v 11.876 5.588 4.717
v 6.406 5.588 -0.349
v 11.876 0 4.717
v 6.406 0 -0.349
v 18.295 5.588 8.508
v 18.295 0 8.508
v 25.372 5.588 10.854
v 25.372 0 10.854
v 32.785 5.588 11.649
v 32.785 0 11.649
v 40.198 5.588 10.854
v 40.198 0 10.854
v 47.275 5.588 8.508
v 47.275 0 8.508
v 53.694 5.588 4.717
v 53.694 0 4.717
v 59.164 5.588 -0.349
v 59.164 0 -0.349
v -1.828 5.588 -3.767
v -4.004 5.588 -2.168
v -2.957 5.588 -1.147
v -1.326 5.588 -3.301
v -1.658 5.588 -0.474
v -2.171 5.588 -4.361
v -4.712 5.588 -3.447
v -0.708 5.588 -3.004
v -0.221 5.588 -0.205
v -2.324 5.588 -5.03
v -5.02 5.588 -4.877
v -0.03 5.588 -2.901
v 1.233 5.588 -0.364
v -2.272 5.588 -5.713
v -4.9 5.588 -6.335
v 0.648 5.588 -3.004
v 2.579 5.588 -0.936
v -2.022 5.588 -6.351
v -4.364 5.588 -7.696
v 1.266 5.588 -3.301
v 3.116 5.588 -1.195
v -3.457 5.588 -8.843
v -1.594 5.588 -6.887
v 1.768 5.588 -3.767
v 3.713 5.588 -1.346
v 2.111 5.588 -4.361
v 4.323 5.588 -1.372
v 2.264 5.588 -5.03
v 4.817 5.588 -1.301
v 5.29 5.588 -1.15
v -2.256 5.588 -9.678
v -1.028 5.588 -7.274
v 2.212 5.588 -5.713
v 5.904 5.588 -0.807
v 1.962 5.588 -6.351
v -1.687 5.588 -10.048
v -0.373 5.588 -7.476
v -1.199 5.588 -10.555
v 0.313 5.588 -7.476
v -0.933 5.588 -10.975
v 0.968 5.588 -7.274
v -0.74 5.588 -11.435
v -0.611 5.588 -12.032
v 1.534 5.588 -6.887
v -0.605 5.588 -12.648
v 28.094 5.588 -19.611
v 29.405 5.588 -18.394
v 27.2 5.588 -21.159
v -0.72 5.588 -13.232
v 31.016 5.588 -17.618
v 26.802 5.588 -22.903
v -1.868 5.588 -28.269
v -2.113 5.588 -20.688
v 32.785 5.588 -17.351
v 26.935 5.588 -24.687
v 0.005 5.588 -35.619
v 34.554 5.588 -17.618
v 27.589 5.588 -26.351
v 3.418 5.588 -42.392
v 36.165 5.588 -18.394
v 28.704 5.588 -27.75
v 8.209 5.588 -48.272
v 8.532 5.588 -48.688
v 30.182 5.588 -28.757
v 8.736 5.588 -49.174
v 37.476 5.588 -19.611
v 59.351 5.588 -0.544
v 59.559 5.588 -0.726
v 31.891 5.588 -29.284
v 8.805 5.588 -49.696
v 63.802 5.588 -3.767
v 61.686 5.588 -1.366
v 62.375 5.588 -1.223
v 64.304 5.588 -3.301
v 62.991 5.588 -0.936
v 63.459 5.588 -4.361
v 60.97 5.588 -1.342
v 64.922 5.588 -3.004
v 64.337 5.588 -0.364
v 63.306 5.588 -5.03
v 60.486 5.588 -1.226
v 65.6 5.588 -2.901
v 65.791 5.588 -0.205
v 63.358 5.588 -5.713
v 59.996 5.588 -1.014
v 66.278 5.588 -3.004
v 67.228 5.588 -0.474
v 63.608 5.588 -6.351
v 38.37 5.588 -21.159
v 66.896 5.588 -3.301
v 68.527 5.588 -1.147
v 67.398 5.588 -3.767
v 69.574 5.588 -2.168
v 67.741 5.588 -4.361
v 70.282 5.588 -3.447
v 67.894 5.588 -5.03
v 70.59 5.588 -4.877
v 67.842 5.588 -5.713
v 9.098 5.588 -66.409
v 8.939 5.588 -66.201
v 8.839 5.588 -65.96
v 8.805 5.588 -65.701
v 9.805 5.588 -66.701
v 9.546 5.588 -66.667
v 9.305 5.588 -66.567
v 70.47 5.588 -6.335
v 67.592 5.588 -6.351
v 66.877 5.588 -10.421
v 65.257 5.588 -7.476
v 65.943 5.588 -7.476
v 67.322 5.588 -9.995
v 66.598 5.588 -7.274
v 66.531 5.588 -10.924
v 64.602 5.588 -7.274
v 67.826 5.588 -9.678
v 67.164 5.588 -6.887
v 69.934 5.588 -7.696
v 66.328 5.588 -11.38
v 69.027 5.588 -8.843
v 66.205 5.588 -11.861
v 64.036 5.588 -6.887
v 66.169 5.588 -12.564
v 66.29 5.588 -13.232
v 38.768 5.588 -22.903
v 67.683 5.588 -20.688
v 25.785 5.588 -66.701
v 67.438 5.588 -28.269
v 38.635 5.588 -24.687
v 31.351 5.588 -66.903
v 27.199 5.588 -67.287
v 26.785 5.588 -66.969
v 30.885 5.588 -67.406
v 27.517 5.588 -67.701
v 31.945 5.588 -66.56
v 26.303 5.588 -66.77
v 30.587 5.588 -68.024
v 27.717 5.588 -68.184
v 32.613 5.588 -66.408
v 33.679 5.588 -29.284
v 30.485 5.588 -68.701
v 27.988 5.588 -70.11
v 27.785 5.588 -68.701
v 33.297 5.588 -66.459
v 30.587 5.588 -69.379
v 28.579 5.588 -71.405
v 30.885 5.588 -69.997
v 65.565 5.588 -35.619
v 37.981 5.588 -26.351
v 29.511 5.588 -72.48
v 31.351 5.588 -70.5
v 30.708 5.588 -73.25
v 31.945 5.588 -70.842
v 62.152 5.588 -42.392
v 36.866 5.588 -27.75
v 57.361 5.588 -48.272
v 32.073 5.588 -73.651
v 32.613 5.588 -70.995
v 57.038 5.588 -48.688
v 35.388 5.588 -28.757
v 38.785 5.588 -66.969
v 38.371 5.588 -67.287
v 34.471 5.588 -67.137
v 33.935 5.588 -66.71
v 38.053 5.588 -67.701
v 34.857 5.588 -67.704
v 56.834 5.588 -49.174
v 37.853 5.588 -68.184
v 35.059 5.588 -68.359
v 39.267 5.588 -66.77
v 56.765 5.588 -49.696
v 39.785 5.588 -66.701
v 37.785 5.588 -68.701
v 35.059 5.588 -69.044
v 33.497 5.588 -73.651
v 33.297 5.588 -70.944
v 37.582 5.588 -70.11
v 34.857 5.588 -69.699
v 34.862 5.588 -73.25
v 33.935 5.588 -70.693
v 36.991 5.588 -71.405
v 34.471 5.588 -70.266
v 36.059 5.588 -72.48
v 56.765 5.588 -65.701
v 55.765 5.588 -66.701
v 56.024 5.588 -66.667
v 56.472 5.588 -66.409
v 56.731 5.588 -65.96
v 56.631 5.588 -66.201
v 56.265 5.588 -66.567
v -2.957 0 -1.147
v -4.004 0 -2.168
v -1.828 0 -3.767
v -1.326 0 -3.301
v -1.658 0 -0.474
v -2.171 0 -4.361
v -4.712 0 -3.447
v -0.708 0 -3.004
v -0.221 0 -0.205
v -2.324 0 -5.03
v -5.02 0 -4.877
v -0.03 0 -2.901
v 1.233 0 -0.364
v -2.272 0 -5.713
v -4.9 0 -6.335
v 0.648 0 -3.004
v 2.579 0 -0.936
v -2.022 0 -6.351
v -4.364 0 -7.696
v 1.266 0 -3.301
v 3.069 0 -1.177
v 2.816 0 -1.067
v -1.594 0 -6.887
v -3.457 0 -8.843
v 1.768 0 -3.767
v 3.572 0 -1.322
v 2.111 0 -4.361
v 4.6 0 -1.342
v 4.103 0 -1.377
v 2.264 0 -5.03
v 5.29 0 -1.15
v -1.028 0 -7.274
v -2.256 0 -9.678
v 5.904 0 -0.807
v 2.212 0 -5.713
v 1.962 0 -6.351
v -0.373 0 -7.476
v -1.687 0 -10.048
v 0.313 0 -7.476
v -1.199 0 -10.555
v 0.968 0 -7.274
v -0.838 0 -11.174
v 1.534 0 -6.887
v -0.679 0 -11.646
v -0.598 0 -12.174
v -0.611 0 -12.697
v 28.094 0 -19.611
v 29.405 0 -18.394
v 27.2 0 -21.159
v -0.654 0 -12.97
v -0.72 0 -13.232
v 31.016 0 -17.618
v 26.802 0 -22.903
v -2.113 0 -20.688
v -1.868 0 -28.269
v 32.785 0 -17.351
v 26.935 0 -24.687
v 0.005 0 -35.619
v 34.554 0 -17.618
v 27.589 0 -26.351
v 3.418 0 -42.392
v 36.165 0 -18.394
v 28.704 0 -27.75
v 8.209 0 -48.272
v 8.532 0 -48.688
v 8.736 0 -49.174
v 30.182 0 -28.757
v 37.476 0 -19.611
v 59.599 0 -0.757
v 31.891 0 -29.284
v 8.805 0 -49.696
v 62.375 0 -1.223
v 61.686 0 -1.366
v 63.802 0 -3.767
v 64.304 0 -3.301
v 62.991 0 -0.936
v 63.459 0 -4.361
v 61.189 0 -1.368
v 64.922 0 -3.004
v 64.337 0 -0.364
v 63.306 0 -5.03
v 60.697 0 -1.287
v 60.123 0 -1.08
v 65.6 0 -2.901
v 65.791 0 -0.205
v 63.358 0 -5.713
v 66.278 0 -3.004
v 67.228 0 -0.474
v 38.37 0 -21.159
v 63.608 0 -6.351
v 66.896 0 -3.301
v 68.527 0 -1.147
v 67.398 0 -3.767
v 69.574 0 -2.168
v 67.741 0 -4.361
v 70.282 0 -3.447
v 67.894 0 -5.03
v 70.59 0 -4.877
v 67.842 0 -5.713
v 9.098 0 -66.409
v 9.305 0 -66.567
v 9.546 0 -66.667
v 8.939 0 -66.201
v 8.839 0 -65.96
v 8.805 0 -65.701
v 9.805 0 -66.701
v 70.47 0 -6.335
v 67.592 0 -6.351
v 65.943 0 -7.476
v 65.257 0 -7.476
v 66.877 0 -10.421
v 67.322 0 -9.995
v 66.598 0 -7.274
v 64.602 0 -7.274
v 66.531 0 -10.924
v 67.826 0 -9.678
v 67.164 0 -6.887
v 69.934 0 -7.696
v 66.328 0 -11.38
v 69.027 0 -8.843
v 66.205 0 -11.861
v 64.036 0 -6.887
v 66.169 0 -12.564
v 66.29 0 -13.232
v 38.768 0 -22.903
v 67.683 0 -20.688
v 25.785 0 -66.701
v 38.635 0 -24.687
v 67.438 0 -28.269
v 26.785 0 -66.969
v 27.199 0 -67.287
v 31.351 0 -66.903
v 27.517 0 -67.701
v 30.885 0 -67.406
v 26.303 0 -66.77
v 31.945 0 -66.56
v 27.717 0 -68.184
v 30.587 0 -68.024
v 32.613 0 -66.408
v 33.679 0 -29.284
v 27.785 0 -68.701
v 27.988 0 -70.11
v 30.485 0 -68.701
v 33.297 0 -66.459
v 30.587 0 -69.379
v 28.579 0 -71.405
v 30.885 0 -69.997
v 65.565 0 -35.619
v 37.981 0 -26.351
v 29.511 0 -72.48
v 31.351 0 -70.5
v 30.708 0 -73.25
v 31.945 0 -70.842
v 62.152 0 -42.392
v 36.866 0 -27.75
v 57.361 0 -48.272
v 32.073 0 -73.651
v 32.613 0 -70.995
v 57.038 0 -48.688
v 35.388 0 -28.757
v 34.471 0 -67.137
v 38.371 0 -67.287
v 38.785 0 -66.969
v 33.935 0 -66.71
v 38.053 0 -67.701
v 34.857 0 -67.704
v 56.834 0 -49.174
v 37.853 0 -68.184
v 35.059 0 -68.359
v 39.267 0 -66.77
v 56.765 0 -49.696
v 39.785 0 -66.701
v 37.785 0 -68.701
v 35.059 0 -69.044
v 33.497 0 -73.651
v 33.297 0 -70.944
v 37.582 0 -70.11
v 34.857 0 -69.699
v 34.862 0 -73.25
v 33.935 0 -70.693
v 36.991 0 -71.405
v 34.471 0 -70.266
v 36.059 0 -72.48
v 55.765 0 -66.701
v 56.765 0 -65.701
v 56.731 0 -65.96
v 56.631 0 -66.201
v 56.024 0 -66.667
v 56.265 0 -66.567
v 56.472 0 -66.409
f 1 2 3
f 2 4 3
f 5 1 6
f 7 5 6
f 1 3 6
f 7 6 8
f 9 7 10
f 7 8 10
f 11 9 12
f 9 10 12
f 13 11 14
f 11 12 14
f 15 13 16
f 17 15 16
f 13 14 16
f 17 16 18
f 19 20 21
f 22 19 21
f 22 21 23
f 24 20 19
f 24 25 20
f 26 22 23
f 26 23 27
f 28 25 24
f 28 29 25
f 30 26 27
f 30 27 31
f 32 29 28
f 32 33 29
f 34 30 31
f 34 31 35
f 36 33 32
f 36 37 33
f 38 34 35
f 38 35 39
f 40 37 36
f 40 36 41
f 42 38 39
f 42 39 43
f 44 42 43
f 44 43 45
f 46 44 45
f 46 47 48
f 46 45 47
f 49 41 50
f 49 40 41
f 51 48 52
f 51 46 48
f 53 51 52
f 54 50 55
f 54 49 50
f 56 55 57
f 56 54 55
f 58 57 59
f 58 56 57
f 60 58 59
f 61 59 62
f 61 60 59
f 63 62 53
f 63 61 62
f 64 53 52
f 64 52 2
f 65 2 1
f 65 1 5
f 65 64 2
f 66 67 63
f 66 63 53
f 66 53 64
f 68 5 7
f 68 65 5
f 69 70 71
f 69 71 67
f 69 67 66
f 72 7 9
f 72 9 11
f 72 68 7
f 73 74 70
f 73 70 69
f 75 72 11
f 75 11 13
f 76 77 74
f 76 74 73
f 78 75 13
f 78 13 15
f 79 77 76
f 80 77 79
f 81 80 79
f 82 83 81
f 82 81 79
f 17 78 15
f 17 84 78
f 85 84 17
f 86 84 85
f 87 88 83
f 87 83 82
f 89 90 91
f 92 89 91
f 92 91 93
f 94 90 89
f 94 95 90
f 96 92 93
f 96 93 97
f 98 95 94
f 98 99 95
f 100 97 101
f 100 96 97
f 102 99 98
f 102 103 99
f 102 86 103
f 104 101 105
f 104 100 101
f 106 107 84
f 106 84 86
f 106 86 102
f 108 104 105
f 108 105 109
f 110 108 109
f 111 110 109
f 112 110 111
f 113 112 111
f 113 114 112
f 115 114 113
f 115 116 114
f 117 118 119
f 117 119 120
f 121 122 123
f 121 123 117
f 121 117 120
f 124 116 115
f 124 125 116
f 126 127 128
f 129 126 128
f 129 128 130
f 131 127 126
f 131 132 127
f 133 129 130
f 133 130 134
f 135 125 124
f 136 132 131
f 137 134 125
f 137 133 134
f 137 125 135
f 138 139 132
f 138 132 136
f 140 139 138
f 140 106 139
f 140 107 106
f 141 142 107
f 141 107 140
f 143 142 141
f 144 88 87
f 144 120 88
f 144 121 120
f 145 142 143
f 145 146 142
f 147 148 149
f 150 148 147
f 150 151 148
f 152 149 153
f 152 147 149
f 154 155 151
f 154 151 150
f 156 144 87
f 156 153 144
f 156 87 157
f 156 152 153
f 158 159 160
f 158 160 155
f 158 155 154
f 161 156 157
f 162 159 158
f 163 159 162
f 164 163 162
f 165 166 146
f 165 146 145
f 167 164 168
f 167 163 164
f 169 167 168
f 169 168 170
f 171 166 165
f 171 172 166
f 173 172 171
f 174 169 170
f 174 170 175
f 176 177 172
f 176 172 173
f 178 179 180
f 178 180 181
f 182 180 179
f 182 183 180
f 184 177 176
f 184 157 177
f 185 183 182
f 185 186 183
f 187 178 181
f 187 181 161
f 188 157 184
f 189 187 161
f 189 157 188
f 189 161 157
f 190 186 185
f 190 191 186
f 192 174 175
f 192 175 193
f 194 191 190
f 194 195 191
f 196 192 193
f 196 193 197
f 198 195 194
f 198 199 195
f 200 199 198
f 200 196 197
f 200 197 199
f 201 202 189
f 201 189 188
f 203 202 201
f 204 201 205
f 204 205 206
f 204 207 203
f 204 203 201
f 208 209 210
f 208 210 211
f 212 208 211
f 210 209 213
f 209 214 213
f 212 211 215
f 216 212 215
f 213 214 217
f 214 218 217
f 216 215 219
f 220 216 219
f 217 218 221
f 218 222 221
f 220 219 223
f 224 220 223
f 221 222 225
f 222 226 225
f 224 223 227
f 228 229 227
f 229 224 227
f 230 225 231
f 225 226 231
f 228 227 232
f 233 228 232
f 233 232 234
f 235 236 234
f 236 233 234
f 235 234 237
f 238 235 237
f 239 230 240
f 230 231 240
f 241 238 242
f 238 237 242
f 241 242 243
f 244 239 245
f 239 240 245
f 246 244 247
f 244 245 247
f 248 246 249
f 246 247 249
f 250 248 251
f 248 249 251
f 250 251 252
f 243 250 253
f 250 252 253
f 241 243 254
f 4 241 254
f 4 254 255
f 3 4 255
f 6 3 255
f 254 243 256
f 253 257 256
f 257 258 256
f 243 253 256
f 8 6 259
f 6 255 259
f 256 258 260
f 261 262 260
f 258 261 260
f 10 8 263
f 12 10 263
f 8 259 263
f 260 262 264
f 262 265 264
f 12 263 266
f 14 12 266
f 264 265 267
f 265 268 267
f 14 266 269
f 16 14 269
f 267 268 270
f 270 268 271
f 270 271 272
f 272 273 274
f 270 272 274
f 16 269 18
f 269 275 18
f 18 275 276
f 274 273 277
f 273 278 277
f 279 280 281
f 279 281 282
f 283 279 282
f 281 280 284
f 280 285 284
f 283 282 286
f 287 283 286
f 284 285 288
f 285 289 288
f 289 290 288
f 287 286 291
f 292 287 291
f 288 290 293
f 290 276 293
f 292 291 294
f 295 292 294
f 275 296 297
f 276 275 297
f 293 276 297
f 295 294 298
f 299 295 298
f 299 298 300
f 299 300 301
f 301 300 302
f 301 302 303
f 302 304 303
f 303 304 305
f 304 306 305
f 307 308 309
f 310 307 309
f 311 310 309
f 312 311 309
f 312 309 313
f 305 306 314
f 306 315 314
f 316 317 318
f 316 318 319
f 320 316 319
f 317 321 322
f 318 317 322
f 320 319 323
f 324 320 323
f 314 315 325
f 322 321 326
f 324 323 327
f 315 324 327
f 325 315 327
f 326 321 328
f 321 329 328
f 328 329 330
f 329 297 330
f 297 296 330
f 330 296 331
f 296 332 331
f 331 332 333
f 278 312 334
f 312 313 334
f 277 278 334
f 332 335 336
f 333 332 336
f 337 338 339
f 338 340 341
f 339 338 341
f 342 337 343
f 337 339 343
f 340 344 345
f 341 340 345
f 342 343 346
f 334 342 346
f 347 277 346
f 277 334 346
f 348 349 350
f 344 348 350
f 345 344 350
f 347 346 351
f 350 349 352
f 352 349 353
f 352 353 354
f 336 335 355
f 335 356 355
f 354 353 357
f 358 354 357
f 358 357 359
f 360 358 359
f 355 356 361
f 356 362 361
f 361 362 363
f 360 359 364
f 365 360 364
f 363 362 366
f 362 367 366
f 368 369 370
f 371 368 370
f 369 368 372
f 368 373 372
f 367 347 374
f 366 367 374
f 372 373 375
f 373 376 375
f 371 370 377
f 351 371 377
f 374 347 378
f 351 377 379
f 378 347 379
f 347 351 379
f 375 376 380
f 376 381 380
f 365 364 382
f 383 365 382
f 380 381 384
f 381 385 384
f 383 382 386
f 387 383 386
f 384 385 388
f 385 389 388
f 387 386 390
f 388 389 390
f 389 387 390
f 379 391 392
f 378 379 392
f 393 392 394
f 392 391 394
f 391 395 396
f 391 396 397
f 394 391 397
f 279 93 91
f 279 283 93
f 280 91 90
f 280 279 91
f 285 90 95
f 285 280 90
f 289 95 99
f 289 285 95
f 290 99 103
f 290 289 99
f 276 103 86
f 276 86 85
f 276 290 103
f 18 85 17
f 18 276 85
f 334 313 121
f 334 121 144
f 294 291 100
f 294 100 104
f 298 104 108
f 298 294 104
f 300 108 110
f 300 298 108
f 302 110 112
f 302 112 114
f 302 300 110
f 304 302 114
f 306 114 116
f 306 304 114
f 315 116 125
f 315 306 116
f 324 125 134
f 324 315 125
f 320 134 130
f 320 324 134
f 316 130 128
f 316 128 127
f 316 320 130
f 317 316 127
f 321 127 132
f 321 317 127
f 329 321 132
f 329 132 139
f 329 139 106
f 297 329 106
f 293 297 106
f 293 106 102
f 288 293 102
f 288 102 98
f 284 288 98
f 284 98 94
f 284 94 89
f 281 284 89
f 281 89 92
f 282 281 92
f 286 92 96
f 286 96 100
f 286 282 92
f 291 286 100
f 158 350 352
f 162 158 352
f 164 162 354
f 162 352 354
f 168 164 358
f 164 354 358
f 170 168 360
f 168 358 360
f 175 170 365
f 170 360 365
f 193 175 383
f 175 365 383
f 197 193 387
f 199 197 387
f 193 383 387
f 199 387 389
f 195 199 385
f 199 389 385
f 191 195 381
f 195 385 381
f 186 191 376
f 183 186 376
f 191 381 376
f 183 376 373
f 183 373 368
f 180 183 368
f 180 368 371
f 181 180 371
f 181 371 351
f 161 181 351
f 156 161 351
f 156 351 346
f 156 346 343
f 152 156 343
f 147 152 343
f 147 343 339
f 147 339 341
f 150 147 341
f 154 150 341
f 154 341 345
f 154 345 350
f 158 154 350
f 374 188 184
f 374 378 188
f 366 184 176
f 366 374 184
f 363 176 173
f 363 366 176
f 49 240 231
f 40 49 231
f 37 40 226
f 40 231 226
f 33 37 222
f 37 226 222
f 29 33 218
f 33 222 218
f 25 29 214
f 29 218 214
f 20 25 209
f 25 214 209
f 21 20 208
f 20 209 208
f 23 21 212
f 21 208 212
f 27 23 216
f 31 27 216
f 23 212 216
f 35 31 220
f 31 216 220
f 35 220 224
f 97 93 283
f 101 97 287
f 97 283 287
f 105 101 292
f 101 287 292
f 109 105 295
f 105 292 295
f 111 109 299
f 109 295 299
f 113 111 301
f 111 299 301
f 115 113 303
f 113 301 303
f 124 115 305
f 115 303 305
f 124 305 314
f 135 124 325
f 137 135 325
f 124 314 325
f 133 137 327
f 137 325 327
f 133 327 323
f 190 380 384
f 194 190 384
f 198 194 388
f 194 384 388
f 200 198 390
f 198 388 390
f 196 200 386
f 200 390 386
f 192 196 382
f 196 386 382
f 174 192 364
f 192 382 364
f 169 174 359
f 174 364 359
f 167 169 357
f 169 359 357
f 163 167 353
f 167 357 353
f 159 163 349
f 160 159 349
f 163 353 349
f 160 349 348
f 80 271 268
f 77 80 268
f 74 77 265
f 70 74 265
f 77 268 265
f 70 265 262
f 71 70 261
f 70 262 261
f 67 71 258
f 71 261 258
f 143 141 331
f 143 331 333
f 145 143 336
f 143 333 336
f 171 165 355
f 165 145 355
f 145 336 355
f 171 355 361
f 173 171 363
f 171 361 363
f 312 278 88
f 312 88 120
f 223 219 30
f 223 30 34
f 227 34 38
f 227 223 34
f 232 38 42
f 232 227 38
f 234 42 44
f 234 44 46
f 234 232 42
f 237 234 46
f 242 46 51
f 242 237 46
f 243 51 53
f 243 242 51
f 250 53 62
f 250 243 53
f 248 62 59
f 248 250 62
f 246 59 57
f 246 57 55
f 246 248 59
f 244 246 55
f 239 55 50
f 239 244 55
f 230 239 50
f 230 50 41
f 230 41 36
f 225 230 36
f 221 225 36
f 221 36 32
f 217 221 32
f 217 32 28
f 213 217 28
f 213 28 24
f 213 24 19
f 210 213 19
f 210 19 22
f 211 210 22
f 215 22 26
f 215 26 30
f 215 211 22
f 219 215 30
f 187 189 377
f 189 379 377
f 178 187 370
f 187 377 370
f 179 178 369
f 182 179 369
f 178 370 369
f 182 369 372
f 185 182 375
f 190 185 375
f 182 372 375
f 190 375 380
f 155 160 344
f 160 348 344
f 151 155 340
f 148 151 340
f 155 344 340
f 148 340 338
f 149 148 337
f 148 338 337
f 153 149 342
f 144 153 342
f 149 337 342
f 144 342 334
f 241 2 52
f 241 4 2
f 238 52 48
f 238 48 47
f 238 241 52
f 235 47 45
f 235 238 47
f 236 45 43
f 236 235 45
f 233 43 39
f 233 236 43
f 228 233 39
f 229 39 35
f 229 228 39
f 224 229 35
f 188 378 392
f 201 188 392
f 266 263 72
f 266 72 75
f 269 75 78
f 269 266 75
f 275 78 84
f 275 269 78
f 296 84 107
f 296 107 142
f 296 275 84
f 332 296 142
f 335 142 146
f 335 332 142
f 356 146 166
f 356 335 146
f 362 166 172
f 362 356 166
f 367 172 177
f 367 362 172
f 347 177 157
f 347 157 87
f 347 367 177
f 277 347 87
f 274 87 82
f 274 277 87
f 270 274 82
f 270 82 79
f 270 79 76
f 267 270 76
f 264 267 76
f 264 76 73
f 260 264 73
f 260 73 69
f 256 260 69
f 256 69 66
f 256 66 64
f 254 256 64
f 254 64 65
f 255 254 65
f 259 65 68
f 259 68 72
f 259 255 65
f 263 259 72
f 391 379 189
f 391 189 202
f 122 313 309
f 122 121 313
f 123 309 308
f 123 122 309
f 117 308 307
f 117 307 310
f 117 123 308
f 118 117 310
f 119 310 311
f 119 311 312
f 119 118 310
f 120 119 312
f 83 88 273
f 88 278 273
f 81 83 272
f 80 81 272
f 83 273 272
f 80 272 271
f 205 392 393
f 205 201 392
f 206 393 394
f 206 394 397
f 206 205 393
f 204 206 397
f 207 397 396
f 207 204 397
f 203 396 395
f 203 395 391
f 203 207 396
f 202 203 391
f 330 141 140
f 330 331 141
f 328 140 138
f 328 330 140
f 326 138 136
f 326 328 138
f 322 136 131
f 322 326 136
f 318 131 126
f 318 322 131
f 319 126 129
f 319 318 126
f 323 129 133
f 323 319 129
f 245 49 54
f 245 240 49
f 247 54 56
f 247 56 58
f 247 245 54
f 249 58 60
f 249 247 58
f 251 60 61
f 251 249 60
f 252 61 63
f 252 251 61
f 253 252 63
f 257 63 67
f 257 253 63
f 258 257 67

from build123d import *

# Parameters (mm, degrees)
SKETCH1_R                  = 35
SKETCH1_R_2                = 6
SKETCH1_R_3                = 5
SKETCH1_R_4                = 2.3
SKETCH1_W                  = 47.96
SKETCH1_H                  = 25
BOSS_EXTRUDE3_DEPTH        = 5.588
F_4_6_4_6_DIAMETER_HOLE1_D = 4.6
FILLET1_R                  = 3
FILLET2_R                  = 2
FILLET3_R                  = 2
FILLET4_R                  = 1


with BuildPart() as part:
    # Sketch1 → Boss-Extrude3 (new body)
    # profile 1 of 5: a face of its own
    with BuildSketch(Plane(origin=(0, 0, 0), x_dir=(1, 0, 0), z_dir=(0, 1, 0))):
        with Locations((32.785, 23.351471482)):
            Circle(SKETCH1_R)
        with Locations(Location((32.785, 23.351471482, 0), (0, 0, 270))):
            Circle(SKETCH1_R_2, mode=Mode.SUBTRACT)
    # profile 2 of 5: a face of its own
    with BuildSketch(Plane(origin=(0, 0, 0), x_dir=(1, 0, 0), z_dir=(0, 1, 0))):
        with Locations((65.600049901, 5.201471482)):
            Circle(SKETCH1_R_3)
        with Locations(Location((65.600049901, 5.201471482, 0), (0, 0, 270))):
            Circle(SKETCH1_R_4, mode=Mode.SUBTRACT)
    # profile 3 of 5: a face of its own
    with BuildSketch(Plane(origin=(0, 0, 0), x_dir=(1, 0, 0), z_dir=(0, 1, 0))):
        with Locations((-0.030049901, 5.201471482)):
            Circle(SKETCH1_R_3)
        with Locations(Location((-0.030049901, 5.201471482, 0), (0, 0, 270))):
            Circle(SKETCH1_R_4, mode=Mode.SUBTRACT)
    # profile 4 of 5: a face of its own
    with BuildSketch(Plane(origin=(0, 0, 0), x_dir=(1, 0, 0), z_dir=(0, 1, 0))):
        with Locations((32.785, 68.701471482)):
            Circle(SKETCH1_R_3)
    # profile 5 of 5: a face of its own
    with BuildSketch(Plane(origin=(0, 0, 0), x_dir=(1, 0, 0), z_dir=(0, 1, 0))):
        with Locations((32.785, 54.201471482)):
            Rectangle(SKETCH1_W, SKETCH1_H)
    extrude(amount=BOSS_EXTRUDE3_DEPTH)

    # Ø4.6 (4.6) Diameter Hole1 (through all)
    with Locations(Plane(origin=(0, 5.588, 0), x_dir=(1, 0, 0), z_dir=(0, 1, 0))):
        with Locations((32.785, 68.701471482)):
            Hole(F_4_6_4_6_DIAMETER_HOLE1_D / 2)

    # Fillet1
    fillet1_edges = [part.edges().sort_by_distance(p)[0] for p in [
        (65.214711372, 2.794, -10.18660079),
        (61.172514444, 2.794, -2.878342174),
        (0.355288628, 2.794, -10.18660079),
        (4.397485556, 2.794, -2.878342174),
    ]]
    fillet(fillet1_edges, radius=FILLET1_R)

    # Fillet2
    fillet2_edges = [part.edges().sort_by_distance(p)[0] for p in [
        (28.202424305, 2.794, -66.701471482),
        (37.367575695, 2.794, -66.701471482),
    ]]
    fillet(fillet2_edges, radius=FILLET2_R)

    # Fillet3
    fillet3_edges = [part.edges().sort_by_distance(p)[0] for p in [
        (8.805, 2.794, -48.845776728),
        (56.765, 2.794, -48.845776728),
    ]]
    fillet(fillet3_edges, radius=FILLET3_R)

    # Fillet4
    fillet4_edges = [part.edges().sort_by_distance(p)[0] for p in [
        (56.765, 2.794, -66.701471482),
        (8.805, 2.794, -66.701471482),
    ]]
    fillet(fillet4_edges, radius=FILLET4_R)


solid = part.part
